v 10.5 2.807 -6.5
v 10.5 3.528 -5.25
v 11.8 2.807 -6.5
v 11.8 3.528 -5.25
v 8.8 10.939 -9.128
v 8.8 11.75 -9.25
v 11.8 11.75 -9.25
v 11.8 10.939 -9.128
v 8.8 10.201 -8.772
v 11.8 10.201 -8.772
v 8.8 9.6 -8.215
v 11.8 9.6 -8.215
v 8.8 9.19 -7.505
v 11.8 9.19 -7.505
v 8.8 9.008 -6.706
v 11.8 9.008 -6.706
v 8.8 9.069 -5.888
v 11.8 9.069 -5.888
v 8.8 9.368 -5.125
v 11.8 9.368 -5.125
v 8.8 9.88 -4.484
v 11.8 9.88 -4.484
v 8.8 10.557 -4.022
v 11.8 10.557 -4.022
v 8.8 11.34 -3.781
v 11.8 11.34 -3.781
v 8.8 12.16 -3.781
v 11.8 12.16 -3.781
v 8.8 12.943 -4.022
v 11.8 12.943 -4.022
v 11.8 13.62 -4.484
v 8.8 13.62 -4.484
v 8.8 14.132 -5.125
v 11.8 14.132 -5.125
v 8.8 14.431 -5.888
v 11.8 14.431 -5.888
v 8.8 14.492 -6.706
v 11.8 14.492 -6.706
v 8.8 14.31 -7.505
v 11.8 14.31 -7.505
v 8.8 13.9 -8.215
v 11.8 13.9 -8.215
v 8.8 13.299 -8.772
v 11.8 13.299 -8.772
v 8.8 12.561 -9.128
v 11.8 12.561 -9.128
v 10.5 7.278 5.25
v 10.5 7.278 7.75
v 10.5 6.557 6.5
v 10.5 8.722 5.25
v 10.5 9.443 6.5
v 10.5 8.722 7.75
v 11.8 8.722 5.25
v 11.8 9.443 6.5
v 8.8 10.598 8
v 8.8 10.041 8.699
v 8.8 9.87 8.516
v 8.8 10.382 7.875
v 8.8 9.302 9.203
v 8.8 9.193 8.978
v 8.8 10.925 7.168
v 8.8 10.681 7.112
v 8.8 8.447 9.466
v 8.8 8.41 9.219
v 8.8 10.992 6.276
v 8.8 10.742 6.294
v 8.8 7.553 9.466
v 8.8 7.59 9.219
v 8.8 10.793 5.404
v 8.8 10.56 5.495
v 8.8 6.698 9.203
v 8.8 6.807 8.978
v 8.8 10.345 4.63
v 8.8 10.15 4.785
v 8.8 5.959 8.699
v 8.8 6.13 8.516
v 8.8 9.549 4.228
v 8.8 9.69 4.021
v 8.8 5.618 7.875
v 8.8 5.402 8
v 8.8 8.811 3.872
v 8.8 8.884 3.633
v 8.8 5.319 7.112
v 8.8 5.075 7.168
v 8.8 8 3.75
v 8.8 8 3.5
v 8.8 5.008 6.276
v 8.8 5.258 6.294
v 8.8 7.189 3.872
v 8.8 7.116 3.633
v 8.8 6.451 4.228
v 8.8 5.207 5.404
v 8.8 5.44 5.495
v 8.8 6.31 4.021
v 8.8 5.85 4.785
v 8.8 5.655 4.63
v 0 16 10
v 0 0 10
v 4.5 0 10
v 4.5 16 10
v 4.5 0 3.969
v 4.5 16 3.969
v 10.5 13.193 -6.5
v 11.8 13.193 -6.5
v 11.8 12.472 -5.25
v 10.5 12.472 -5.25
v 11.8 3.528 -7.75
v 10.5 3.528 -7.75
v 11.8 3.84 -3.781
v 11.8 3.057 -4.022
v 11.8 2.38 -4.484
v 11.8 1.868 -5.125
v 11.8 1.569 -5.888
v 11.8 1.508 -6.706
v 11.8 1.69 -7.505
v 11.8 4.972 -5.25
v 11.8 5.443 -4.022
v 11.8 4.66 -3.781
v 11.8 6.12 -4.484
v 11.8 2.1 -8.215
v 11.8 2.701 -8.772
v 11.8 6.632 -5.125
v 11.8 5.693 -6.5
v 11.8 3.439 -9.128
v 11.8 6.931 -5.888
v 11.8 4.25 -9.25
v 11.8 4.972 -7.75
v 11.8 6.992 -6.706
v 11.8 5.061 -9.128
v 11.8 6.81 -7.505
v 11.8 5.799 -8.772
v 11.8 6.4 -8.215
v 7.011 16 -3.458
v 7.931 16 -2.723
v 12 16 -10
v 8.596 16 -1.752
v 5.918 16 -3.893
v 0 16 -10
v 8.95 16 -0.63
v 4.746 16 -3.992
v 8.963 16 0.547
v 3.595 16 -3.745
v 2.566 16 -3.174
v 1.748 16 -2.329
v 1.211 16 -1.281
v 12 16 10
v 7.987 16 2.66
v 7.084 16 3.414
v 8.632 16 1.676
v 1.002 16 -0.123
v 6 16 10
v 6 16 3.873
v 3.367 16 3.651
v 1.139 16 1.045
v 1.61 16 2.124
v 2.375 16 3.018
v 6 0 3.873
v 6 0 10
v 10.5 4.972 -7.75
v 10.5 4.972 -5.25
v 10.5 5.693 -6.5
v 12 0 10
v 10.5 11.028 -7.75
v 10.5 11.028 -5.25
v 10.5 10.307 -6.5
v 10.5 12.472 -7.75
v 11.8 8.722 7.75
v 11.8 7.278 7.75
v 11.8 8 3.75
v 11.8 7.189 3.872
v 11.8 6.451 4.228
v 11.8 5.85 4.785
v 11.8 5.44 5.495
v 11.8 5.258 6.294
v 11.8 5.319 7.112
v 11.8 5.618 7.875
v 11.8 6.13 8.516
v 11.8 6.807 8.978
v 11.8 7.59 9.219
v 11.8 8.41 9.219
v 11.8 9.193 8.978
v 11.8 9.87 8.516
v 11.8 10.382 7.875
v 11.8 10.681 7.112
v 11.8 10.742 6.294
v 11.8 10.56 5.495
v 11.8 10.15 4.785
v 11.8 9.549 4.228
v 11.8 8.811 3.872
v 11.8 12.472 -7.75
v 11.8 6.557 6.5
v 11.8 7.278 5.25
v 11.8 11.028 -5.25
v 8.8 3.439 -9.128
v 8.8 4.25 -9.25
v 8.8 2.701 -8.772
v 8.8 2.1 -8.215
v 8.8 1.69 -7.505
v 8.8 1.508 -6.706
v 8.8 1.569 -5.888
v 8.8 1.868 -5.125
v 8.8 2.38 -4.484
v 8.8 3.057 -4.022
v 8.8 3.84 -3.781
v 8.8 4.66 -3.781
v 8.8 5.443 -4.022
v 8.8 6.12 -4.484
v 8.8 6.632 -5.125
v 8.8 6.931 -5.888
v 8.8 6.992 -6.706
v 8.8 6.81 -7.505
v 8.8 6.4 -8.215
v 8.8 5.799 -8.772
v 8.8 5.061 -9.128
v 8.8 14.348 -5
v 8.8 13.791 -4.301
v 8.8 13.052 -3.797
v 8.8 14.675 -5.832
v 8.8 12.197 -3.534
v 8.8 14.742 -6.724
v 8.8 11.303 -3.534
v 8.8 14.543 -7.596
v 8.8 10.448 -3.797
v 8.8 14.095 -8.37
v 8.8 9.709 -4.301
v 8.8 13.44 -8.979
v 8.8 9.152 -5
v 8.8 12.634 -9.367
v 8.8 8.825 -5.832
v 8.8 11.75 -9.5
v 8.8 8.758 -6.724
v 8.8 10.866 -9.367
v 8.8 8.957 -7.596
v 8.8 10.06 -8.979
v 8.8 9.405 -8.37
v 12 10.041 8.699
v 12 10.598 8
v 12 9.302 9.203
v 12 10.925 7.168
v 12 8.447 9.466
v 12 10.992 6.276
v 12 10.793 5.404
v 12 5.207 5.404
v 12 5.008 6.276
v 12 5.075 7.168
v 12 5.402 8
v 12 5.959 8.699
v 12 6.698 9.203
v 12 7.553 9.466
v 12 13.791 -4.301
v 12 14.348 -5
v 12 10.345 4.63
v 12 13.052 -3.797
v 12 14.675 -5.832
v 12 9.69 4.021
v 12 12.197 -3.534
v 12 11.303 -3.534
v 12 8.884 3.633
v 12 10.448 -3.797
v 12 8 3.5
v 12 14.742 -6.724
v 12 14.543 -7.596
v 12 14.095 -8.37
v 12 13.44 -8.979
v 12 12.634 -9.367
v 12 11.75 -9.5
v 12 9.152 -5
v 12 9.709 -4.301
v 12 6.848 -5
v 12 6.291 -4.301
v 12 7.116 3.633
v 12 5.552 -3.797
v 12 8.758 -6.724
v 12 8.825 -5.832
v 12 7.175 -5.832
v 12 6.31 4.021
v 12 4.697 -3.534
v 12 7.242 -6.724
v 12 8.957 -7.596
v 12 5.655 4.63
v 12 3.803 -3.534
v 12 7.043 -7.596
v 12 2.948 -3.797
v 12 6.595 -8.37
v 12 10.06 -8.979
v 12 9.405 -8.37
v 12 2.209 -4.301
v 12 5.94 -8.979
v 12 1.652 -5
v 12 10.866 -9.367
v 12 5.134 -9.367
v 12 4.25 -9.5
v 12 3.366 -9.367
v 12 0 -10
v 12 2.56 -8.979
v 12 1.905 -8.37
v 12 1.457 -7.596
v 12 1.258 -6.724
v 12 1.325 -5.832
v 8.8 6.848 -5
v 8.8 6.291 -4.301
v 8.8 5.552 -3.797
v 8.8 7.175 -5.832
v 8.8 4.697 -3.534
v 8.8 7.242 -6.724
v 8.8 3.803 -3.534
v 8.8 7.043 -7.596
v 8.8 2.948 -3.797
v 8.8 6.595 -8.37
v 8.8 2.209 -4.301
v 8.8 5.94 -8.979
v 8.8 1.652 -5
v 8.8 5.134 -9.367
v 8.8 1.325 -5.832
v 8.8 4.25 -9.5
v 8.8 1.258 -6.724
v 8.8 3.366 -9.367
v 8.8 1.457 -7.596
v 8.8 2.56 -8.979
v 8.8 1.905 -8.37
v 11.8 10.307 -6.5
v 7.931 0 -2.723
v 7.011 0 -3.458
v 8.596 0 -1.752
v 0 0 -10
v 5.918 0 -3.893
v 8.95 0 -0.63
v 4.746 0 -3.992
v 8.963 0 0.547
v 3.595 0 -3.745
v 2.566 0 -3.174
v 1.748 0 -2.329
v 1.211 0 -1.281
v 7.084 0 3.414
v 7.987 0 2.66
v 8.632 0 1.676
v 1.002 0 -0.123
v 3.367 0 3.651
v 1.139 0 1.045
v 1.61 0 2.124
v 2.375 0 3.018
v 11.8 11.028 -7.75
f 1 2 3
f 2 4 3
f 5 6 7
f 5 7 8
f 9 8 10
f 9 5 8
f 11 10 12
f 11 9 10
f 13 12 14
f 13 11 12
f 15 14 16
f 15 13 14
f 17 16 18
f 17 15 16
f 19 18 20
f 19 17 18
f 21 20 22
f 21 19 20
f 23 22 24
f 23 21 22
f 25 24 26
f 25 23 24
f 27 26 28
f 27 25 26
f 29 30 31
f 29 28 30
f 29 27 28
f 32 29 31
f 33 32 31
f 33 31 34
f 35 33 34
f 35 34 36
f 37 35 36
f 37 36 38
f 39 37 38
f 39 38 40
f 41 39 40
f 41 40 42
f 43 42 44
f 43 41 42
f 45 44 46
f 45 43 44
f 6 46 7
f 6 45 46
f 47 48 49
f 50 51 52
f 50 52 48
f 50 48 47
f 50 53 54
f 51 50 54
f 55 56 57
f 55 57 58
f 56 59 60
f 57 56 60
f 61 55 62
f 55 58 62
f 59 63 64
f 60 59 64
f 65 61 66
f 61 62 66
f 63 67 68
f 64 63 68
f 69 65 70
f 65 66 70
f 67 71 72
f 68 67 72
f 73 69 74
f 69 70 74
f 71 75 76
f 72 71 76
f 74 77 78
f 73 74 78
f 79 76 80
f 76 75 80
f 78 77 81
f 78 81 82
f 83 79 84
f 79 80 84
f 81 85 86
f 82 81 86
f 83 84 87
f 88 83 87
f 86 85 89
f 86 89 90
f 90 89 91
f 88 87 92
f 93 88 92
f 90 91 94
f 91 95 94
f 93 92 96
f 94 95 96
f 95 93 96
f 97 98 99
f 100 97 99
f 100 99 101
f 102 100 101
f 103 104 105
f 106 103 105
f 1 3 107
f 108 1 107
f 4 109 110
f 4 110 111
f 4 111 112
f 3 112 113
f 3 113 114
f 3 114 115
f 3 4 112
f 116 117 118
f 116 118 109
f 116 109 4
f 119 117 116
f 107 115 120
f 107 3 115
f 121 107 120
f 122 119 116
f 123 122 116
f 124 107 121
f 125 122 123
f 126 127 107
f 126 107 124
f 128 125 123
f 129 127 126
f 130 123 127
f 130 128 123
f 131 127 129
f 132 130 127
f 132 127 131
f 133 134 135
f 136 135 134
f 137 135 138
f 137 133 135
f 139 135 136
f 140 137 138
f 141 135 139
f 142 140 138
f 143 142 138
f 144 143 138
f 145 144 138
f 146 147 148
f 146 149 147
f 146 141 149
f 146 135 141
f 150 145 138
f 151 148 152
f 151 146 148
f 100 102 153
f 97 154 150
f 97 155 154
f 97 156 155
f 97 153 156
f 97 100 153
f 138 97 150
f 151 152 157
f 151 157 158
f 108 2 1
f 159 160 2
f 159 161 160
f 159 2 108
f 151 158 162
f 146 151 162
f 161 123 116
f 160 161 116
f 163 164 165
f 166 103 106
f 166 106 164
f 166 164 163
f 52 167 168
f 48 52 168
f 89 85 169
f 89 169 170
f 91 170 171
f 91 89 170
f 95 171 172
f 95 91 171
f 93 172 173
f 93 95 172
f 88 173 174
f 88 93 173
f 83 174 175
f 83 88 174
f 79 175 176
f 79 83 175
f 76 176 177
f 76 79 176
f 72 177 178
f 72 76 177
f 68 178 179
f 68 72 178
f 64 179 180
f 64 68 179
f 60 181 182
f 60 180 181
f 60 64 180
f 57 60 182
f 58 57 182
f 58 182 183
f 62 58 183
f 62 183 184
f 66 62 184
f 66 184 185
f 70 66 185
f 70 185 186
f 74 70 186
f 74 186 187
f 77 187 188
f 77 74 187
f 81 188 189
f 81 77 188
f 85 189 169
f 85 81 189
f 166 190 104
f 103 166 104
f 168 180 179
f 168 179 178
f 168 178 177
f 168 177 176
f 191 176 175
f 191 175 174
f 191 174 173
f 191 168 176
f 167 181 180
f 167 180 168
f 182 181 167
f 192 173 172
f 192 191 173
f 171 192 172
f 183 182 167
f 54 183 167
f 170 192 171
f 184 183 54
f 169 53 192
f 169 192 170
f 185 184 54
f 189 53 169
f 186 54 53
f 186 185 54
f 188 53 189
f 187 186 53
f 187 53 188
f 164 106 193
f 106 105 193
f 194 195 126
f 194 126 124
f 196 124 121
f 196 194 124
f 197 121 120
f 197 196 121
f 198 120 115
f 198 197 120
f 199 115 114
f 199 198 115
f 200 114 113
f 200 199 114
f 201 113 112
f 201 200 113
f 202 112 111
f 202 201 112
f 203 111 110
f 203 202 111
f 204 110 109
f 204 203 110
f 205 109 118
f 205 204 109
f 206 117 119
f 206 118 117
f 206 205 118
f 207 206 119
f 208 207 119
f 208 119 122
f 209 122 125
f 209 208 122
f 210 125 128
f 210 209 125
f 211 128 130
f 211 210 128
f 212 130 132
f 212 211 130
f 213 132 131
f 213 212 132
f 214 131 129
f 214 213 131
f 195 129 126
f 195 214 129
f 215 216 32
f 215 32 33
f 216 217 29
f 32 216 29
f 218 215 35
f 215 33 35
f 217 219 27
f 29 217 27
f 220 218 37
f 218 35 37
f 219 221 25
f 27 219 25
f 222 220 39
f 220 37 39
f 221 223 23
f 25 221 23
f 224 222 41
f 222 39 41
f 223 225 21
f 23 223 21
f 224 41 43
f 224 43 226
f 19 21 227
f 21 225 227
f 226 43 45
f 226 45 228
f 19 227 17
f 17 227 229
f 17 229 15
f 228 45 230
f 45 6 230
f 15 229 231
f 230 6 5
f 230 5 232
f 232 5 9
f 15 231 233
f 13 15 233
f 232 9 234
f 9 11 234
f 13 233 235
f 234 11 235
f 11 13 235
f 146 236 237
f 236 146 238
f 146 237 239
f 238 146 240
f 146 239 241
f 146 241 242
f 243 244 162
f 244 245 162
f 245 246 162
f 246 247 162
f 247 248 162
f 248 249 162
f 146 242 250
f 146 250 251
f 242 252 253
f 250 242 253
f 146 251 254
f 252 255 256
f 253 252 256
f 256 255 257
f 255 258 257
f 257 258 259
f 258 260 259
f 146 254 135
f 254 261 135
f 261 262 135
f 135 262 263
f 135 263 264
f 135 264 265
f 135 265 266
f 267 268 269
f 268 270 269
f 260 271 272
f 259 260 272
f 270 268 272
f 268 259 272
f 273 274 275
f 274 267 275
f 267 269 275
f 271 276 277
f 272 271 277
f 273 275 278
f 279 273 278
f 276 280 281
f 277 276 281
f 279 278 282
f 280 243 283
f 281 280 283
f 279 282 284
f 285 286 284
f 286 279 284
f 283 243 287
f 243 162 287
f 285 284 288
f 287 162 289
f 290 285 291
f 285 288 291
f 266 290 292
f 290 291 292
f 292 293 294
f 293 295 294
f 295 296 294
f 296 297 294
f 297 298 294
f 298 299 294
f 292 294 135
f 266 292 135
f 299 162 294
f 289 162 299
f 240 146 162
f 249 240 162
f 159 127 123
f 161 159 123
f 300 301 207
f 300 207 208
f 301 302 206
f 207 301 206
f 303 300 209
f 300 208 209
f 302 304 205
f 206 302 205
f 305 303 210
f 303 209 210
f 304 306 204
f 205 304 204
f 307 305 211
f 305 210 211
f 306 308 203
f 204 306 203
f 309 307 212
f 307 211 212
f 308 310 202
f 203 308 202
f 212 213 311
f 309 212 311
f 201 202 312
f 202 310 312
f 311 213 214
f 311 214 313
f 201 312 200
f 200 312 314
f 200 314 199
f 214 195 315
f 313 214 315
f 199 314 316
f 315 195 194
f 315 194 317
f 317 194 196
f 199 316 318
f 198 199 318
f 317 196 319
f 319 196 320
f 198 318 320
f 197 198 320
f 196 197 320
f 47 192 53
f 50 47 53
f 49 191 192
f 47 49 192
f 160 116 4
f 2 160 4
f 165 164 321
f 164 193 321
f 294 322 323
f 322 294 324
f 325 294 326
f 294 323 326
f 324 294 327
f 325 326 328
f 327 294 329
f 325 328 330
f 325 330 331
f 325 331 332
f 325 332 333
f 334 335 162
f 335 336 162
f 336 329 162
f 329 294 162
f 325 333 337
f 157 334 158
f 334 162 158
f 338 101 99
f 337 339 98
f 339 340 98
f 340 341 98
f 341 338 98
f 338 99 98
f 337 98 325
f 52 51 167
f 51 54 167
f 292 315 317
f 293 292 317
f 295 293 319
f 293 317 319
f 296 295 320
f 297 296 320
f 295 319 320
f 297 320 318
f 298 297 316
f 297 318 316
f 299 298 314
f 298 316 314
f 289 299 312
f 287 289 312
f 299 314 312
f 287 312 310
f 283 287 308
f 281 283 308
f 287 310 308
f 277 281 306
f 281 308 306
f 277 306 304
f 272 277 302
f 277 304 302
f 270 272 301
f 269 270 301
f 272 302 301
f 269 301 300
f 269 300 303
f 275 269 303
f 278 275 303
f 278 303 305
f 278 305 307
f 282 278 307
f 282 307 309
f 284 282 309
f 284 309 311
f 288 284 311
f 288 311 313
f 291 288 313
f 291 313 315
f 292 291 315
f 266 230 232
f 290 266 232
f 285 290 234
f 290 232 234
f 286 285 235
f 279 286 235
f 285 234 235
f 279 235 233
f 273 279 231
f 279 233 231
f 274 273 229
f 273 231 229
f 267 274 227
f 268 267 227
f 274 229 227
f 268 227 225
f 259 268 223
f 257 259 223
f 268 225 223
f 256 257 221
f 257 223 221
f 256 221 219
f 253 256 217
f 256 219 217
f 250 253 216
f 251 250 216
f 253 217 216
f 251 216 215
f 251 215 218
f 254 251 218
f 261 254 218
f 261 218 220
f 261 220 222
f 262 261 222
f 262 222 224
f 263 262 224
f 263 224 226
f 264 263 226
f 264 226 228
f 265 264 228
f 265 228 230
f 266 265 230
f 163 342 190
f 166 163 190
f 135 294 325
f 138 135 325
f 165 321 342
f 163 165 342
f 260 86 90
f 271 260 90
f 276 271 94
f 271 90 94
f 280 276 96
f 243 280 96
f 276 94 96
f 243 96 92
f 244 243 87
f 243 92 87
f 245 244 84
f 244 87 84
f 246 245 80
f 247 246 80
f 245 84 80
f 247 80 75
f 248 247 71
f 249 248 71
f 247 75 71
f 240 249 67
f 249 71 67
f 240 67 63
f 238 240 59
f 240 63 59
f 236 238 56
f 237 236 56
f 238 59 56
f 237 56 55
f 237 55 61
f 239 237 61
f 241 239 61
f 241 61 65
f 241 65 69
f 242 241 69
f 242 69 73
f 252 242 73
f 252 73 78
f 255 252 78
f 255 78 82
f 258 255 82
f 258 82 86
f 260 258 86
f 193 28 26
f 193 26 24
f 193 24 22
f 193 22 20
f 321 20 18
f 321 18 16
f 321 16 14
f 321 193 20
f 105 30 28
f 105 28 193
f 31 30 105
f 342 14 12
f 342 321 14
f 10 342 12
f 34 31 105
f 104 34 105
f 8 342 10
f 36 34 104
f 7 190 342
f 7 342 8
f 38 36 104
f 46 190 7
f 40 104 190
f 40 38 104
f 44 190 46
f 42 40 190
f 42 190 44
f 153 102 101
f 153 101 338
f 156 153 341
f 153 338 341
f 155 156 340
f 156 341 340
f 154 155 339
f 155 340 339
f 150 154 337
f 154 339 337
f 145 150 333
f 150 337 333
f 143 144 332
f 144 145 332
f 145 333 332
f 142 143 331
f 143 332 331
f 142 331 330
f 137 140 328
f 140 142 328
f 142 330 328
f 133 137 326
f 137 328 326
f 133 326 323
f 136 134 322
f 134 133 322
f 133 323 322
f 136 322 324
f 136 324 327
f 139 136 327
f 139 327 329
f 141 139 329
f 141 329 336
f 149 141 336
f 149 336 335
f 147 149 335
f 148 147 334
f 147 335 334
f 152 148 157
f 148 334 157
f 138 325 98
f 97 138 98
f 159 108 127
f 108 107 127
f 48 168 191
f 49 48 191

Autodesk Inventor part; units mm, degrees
sketch "Skizze_1" plane through (0, 0, 0) normal (0, 1, 0) x (-1, 0, 0)
  line L0 (0, 10) -> (-4.5, 10)
  line L1 (-4.5, 10) -> (-4.5, 3.9686)
  arc A0 (-6, 3.873) -> (-4.5, 3.9686) centre (-5, 0) ccw
  line L2 (-6, 3.873) -> (-6, 10)
  line L3 (-6, 10) -> (-12, 10)
  line L4 (-12, 10) -> (-12, -10)
  line L5 (-12, -10) -> (0, -10)
  line L6 (0, -10) -> (0, 10)
extrude "Extrusion1" add sketch "Skizze_1" along normal blind 16
sketch "Sketch2" plane through (12, 0, 10) normal (1, 0, 0) x (0, 0, -1)
  point P0 (16.5, 4.25)
hole "Hole1" at (12, 4.25, -6.5) direction (-1, 0, 0) diameter 6 depth 3.2
sketch "Sketch3" plane through (12, 0, 10) normal (1, 0, 0) x (0, 0, -1)
  point P0 (16.5, 11.75)
hole "Hole2" at (12, 11.75, -6.5) direction (-1, 0, 0) diameter 6 depth 3.2
sketch "Skizze_5" plane through (8.8, 4.25, -6.5) normal (1, 0, 0) x (0, 0, -1)
  circle A0 centre (0, 0) radius 2.75
extrude "Extrusion2" add sketch "Skizze_5" along normal blind 3
sketch "Skizze_6" plane through (11.8, 4.25, -6.5) normal (1, 0, 0) x (0, 0, -1)
  line L0 (-1.25, -0.7217) -> (0, -1.4434)
  line L1 (0, -1.4434) -> (1.25, -0.7217)
  line L2 (1.25, -0.7217) -> (1.25, 0.7217)
  line L3 (1.25, 0.7217) -> (0, 1.4434)
  line L4 (0, 1.4434) -> (-1.25, 0.7217)
  line L5 (-1.25, 0.7217) -> (-1.25, -0.7217)
extrude "Extrusion3" cut sketch "Skizze_6" against normal blind 1.3
sketch "Skizze_4" plane through (8.8, 11.75, -6.5) normal (1, 0, 0) x (0, 0, -1)
  circle A0 centre (0, 0) radius 2.75
extrude "Extrusion4" add sketch "Skizze_4" along normal blind 3
sketch "Skizze_7" plane through (11.8, 11.75, -6.5) normal (1, 0, 0) x (0, 0, -1)
  line L0 (-1.25, -0.7217) -> (0, -1.4434)
  line L1 (0, -1.4434) -> (1.25, -0.7217)
  line L2 (1.25, -0.7217) -> (1.25, 0.7217)
  line L3 (1.25, 0.7217) -> (0, 1.4434)
  line L4 (0, 1.4434) -> (-1.25, 0.7217)
  line L5 (-1.25, 0.7217) -> (-1.25, -0.7217)
extrude "Extrusion5" cut sketch "Skizze_7" against normal blind 1.3
sketch "Sketch8" plane through (12, 0, 10) normal (1, 0, 0) x (0, 0, -1)
  point P0 (3.5, 8)
hole "Hole3" at (12, 8, 6.5) direction (-1, 0, 0) diameter 6 depth 3.2
sketch "Skizze_12" plane through (8.8, 8, 6.5) normal (1, 0, 0) x (0, 0, -1)
  circle A0 centre (0, 0) radius 2.75
extrude "Extrusion6" add sketch "Skizze_12" along normal blind 3
sketch "Skizze_13" plane through (11.8, 8, 6.5) normal (1, 0, 0) x (0, 0, -1)
  line L0 (-1.25, -0.7217) -> (0, -1.4434)
  line L1 (0, -1.4434) -> (1.25, -0.7217)
  line L2 (1.25, -0.7217) -> (1.25, 0.7217)
  line L3 (1.25, 0.7217) -> (0, 1.4434)
  line L4 (0, 1.4434) -> (-1.25, 0.7217)
  line L5 (-1.25, 0.7217) -> (-1.25, -0.7217)
extrude "Extrusion7" cut sketch "Skizze_13" against normal blind 1.3
ref_plane "Naeherungsschalter_Du8_XY" through (5, 0, 0) normal (0, 1, 0) x (1, 0, 0)
ref_plane "Naeherungsschalter_Du8_YZ" through (5, 0, 0) normal (1, 0, 0) x (0, 0, -1)
ref_plane "Naeherungsschalter_Du8_ZX" through (5, 0, 0) normal (0, 0, -1) x (0, 1, 0)
ref_plane "apzbplus_XY" through (4.5, 11.75, -6.5) normal (0, 1, 0) x (1, 0, 0)
ref_plane "apzbplus_YZ" through (4.5, 11.75, -6.5) normal (1, 0, 0) x (0, 0, -1)
ref_plane "apzbplus_ZX" through (4.5, 11.75, -6.5) normal (0, 0, -1) x (0, 1, 0)
ref_plane "jgz64_XY" through (0, 8, 6.5) normal (0, 0, 1) x (1, 0, 0)
ref_plane "jgz64_YZ" through (0, 8, 6.5) normal (1, 0, 0) x (0, 1, 0)
ref_plane "jgz64_ZX" through (0, 8, 6.5) normal (0, 1, 0) x (0, 0, 1)
ref_plane "jpg64_XY" through (0, 11, 0) normal (1, 0, 0) x (0, 0, -1)
ref_plane "jpg64_YZ" through (0, 11, 0) normal (0, 0, -1) x (0, 1, 0)
ref_plane "jpg64_ZX" through (0, 11, 0) normal (0, 1, 0) x (1, 0, 0)
ref_plane "klh1_XY" through (0, 11.75, -6.5) normal (1, 0, 0) x (0, 0, -1)
ref_plane "klh1_YZ" through (0, 11.75, -6.5) normal (0, 0, -1) x (0, 1, 0)
ref_plane "klh1_ZX" through (0, 11.75, -6.5) normal (0, 1, 0) x (1, 0, 0)
ref_plane "klh_64_XY" through (0, 8, -6.5) normal (1, 0, 0) x (0, 0, -1)
ref_plane "klh_64_YZ" through (0, 8, -6.5) normal (0, 0, -1) x (0, 1, 0)
ref_plane "klh_64_ZX" through (0, 8, -6.5) normal (0, 1, 0) x (1, 0, 0)
ref_plane "klh_80_XY" through (0, 4.25, -6.5) normal (1, 0, 0) x (0, 0, -1)
ref_plane "klh_80_YZ" through (0, 4.25, -6.5) normal (0, 0, -1) x (0, 1, 0)
ref_plane "klh_80_ZX" through (0, 4.25, -6.5) normal (0, 1, 0) x (1, 0, 0)
ref_plane "pzn_300_380_XY" through (4.5, 8, 6.5) normal (0, 0, 1) x (1, 0, 0)
ref_plane "pzn_300_380_YZ" through (4.5, 8, 6.5) normal (1, 0, 0) x (0, 1, 0)
ref_plane "pzn_300_380_ZX" through (4.5, 8, 6.5) normal (0, 1, 0) x (0, 0, 1)
ref_plane "vst___geh_XY" through (0, 0, 0) normal (1, 0, 0) x (0, 0, -1)
ref_plane "vst___geh_YZ" through (0, 0, 0) normal (0, 0, -1) x (0, 1, 0)
ref_plane "vst___geh_ZX" through (0, 0, 0) normal (0, 1, 0) x (1, 0, 0)
ref_plane "vst___geh_2_XY" through (0, 16, 0) normal (1, 0, 0) x (0, 0, -1)
ref_plane "vst___geh_2_YZ" through (0, 16, 0) normal (0, 0, -1) x (0, 1, 0)
ref_plane "vst___geh_2_ZX" through (0, 16, 0) normal (0, 1, 0) x (1, 0, 0)
properties part number "SCHUNK-5503506 Halter fuer NHS KL03"
